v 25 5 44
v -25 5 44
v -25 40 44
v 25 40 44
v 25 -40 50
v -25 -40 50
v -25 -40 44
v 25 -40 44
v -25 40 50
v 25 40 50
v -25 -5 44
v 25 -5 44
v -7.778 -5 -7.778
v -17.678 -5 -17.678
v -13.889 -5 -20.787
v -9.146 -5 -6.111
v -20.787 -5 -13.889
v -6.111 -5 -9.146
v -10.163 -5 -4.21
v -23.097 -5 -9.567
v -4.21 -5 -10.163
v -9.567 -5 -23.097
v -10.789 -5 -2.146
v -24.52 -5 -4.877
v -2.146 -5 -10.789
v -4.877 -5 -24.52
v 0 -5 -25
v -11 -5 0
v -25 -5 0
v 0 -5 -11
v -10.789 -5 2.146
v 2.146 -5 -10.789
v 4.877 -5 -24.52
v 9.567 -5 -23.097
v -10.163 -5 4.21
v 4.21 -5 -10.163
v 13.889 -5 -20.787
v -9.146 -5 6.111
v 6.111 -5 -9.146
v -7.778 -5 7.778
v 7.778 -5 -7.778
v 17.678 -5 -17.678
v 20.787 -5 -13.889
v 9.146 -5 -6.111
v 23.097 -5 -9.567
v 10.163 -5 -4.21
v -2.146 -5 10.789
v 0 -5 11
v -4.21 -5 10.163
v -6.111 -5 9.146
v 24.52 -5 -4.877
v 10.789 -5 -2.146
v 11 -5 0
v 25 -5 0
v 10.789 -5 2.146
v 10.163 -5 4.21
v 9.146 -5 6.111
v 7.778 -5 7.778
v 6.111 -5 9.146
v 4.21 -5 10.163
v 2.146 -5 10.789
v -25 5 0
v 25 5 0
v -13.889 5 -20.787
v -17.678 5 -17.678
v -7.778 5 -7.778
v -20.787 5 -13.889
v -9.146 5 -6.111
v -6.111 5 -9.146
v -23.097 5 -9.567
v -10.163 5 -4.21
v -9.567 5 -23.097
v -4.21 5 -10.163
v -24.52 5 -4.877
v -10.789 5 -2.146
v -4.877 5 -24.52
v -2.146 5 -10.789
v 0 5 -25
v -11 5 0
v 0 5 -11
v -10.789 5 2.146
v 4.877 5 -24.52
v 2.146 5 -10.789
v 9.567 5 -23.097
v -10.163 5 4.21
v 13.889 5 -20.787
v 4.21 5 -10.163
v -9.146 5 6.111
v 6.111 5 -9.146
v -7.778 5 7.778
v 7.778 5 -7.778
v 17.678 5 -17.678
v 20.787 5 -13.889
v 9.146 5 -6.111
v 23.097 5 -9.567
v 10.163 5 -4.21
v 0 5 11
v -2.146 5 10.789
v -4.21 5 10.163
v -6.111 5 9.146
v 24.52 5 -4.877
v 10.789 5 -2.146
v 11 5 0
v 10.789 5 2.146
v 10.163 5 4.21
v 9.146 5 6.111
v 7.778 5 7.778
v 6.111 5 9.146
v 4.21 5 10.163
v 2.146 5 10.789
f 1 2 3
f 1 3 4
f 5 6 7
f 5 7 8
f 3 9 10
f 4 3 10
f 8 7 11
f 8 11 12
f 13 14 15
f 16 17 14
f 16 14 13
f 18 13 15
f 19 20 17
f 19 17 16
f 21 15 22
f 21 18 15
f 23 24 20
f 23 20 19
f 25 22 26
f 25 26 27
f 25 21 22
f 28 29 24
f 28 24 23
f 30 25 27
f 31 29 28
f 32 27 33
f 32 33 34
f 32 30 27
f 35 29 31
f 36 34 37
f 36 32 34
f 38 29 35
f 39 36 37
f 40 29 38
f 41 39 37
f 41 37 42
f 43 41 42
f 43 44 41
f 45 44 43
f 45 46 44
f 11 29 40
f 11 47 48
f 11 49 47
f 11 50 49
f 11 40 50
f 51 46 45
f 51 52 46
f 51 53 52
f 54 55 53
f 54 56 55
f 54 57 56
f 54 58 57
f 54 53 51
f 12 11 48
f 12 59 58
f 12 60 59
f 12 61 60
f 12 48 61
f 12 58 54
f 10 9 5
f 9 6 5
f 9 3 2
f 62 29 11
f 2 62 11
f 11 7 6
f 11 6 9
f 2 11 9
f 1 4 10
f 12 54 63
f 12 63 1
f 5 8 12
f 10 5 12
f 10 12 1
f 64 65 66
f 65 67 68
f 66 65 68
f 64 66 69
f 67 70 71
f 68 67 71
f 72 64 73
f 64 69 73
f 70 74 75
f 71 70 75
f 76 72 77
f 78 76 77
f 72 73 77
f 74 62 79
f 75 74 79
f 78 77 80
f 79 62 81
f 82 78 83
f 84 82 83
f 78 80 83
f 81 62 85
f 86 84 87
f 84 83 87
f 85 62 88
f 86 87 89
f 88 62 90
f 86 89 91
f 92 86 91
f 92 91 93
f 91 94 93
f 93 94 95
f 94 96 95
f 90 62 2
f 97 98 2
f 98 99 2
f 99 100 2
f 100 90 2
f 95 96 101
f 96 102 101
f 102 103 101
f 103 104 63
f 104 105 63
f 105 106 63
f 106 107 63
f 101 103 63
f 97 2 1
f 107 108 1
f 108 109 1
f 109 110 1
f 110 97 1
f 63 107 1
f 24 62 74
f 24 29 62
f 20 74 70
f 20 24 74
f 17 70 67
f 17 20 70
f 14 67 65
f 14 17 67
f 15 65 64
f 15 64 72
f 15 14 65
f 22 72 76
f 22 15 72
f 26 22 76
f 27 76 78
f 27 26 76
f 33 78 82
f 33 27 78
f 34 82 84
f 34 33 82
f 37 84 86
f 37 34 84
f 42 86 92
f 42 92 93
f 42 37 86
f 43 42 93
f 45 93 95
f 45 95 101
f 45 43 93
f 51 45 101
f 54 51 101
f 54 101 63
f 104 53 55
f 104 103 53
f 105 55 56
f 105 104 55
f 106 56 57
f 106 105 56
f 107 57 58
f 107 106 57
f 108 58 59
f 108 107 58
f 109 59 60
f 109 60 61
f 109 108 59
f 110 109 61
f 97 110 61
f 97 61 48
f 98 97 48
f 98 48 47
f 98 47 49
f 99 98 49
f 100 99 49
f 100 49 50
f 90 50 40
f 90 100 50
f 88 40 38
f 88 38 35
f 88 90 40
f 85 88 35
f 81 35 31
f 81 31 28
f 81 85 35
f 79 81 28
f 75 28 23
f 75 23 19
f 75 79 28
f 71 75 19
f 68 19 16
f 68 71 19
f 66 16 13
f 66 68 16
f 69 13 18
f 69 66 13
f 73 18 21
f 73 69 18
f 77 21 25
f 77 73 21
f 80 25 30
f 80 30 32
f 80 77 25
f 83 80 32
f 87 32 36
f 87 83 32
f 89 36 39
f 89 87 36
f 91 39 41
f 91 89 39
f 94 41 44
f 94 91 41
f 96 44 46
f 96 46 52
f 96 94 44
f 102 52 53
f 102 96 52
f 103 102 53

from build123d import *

# Parameters (mm, degrees)
F0_R     = 11
F0_W     = 50
F0_H     = 6
F1_DEPTH = 5
F2_DEPTH = 40


with BuildPart() as f1:
    # F0 (on Front) → F1 (new body, symmetric)
    with BuildSketch(Plane.XZ):
        with BuildLine():
            Line((-25, 44), (-25, 0))
            ThreePointArc((-25, 0), (0, -25), (25, 0))
            Line((25, 0), (25, 44))
            Line((25, 44), (-25, 44))
        make_face()
        Circle(F0_R, mode=Mode.SUBTRACT)
        with Locations((0, 47)):
            Rectangle(F0_W, F0_H)
    extrude(amount=F1_DEPTH, both=True)

    # F0 (on Front) → F2 (join, symmetric)
    with BuildSketch(Plane.XZ):
        with Locations((0, 47)):
            Rectangle(F0_W, F0_H)
    extrude(amount=F2_DEPTH, both=True)


solid = f1.part
